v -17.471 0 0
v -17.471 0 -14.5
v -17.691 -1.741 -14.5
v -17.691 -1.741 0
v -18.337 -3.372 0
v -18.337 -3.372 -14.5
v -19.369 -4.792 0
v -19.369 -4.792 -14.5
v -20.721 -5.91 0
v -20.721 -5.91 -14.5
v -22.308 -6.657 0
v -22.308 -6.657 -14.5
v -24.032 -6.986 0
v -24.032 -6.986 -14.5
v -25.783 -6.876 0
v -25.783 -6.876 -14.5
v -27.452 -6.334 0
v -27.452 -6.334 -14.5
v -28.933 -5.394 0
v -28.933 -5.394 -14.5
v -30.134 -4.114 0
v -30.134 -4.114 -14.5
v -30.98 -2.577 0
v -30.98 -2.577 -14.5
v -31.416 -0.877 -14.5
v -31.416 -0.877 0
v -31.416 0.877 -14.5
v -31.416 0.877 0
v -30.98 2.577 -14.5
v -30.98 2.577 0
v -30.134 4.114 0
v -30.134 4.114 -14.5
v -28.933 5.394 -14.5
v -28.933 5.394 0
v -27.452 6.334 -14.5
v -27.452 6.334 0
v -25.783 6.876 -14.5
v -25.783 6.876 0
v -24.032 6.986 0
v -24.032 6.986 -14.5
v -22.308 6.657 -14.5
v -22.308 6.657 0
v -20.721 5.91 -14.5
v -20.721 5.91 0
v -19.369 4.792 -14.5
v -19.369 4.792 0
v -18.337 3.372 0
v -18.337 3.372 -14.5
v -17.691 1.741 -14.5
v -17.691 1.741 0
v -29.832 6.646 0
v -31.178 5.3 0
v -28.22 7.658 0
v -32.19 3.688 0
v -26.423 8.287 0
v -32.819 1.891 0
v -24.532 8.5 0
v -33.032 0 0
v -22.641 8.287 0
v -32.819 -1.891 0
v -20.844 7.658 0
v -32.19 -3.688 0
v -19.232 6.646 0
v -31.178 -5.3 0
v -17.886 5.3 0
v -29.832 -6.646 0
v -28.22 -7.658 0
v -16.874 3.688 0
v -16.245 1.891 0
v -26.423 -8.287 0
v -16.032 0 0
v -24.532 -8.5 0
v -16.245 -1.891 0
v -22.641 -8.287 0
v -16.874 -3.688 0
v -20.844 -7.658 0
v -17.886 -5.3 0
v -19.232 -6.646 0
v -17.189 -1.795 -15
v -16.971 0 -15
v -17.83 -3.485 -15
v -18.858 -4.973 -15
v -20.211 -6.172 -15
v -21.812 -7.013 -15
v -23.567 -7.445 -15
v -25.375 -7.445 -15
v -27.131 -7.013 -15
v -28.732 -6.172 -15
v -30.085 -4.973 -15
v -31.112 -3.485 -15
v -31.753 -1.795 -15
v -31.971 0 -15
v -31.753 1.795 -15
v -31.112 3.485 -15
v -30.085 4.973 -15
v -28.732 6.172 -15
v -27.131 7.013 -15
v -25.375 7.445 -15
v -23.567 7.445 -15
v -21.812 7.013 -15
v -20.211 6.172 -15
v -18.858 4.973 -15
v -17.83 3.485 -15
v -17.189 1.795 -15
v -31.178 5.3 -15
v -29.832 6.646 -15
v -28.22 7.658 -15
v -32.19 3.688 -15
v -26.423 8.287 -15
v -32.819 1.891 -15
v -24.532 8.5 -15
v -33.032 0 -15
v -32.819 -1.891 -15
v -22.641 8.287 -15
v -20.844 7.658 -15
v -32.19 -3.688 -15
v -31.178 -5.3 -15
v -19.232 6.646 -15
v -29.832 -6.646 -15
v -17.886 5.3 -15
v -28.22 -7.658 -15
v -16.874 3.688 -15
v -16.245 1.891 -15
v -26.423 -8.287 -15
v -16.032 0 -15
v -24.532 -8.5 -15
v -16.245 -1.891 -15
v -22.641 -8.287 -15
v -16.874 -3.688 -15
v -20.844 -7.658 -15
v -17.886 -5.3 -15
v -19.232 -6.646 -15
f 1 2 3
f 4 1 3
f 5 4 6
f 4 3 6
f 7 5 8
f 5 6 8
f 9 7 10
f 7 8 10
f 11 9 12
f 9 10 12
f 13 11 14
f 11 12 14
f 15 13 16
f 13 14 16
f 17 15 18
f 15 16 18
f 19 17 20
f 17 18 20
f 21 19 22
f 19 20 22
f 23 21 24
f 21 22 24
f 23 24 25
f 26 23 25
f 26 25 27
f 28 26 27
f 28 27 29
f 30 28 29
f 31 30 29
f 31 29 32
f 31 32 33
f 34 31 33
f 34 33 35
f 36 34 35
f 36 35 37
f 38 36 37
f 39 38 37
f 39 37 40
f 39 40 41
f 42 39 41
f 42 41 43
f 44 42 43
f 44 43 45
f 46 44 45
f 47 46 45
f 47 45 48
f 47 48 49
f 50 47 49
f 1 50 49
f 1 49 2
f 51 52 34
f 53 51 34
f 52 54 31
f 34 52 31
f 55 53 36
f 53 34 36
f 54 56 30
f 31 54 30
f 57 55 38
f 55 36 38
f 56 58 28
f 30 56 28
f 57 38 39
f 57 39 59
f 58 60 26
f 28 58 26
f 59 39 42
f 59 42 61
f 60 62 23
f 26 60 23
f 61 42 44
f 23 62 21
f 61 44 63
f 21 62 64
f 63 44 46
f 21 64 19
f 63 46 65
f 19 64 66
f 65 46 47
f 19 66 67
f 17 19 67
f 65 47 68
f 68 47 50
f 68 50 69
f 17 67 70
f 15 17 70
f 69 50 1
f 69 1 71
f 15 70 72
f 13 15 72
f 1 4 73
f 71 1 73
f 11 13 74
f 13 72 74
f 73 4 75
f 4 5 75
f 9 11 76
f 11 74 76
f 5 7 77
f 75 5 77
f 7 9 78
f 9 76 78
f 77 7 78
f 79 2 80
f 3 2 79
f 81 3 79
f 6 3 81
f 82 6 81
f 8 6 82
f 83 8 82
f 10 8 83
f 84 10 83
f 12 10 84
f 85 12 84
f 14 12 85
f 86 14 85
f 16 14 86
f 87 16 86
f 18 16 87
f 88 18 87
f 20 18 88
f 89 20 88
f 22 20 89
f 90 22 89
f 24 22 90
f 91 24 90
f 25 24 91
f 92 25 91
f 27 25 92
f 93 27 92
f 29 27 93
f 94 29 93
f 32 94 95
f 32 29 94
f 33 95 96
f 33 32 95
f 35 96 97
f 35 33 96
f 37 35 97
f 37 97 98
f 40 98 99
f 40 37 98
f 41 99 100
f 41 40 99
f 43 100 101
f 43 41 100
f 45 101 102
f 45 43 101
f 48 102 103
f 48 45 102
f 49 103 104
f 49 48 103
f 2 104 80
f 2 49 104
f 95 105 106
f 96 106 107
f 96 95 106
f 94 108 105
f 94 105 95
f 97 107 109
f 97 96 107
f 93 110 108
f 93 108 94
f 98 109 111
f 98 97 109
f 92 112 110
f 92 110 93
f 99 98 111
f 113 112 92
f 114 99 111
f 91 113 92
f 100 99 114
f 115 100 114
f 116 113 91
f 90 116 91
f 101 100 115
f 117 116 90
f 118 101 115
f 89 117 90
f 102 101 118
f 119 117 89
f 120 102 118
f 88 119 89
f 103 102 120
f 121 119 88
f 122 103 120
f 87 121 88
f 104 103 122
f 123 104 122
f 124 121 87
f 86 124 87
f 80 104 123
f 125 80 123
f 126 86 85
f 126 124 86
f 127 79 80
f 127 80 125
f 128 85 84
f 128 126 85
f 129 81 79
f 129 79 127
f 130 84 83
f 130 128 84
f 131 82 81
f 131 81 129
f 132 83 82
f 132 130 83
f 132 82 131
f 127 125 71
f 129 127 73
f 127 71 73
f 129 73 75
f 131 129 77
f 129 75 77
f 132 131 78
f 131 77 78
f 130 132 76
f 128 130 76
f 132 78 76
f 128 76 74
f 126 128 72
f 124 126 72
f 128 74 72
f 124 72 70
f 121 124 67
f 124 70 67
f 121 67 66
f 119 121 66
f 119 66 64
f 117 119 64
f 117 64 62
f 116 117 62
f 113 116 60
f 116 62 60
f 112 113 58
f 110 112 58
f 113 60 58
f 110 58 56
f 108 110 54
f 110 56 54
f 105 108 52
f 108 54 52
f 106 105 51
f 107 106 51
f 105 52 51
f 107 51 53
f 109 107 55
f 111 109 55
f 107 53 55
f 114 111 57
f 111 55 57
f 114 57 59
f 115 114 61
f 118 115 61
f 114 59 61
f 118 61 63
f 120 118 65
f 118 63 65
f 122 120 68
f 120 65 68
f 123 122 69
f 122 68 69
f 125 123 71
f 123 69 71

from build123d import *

# Parameters (mm, degrees)
SKETCH002_R  = 8.5
PAD001_DEPTH = 15
SKETCH003_R  = 7
POCKET_DEPTH = 28
CHAMFER_SIZE = 0.5


with BuildPart() as part:
    # Sketch002 (on Face1 of ReferenceFillet) → Pad001 (new body)
    with BuildSketch(Plane(origin=(0, 0, 0), x_dir=(1, 0, 0), z_dir=(0, 0, -1))):
        with Locations((-24.532044, 0)):
            Circle(SKETCH002_R)
    extrude(amount=PAD001_DEPTH)

    # Sketch003 (on Face3 of Pad001) → Pocket (cut)
    with BuildSketch(Plane(origin=(0, 0, -15), x_dir=(1, 0, 0), z_dir=(0, 0, -1))):
        with Locations((-24.47134, 0)):
            Circle(SKETCH003_R)
    extrude(amount=-POCKET_DEPTH, mode=Mode.SUBTRACT)

    # Chamfer
    chamfer_edges = [part.edges().sort_by_distance(p)[0] for p in [
        (-31.47134, 0, -15),
    ]]
    chamfer(chamfer_edges, length=CHAMFER_SIZE)


solid = part.part
